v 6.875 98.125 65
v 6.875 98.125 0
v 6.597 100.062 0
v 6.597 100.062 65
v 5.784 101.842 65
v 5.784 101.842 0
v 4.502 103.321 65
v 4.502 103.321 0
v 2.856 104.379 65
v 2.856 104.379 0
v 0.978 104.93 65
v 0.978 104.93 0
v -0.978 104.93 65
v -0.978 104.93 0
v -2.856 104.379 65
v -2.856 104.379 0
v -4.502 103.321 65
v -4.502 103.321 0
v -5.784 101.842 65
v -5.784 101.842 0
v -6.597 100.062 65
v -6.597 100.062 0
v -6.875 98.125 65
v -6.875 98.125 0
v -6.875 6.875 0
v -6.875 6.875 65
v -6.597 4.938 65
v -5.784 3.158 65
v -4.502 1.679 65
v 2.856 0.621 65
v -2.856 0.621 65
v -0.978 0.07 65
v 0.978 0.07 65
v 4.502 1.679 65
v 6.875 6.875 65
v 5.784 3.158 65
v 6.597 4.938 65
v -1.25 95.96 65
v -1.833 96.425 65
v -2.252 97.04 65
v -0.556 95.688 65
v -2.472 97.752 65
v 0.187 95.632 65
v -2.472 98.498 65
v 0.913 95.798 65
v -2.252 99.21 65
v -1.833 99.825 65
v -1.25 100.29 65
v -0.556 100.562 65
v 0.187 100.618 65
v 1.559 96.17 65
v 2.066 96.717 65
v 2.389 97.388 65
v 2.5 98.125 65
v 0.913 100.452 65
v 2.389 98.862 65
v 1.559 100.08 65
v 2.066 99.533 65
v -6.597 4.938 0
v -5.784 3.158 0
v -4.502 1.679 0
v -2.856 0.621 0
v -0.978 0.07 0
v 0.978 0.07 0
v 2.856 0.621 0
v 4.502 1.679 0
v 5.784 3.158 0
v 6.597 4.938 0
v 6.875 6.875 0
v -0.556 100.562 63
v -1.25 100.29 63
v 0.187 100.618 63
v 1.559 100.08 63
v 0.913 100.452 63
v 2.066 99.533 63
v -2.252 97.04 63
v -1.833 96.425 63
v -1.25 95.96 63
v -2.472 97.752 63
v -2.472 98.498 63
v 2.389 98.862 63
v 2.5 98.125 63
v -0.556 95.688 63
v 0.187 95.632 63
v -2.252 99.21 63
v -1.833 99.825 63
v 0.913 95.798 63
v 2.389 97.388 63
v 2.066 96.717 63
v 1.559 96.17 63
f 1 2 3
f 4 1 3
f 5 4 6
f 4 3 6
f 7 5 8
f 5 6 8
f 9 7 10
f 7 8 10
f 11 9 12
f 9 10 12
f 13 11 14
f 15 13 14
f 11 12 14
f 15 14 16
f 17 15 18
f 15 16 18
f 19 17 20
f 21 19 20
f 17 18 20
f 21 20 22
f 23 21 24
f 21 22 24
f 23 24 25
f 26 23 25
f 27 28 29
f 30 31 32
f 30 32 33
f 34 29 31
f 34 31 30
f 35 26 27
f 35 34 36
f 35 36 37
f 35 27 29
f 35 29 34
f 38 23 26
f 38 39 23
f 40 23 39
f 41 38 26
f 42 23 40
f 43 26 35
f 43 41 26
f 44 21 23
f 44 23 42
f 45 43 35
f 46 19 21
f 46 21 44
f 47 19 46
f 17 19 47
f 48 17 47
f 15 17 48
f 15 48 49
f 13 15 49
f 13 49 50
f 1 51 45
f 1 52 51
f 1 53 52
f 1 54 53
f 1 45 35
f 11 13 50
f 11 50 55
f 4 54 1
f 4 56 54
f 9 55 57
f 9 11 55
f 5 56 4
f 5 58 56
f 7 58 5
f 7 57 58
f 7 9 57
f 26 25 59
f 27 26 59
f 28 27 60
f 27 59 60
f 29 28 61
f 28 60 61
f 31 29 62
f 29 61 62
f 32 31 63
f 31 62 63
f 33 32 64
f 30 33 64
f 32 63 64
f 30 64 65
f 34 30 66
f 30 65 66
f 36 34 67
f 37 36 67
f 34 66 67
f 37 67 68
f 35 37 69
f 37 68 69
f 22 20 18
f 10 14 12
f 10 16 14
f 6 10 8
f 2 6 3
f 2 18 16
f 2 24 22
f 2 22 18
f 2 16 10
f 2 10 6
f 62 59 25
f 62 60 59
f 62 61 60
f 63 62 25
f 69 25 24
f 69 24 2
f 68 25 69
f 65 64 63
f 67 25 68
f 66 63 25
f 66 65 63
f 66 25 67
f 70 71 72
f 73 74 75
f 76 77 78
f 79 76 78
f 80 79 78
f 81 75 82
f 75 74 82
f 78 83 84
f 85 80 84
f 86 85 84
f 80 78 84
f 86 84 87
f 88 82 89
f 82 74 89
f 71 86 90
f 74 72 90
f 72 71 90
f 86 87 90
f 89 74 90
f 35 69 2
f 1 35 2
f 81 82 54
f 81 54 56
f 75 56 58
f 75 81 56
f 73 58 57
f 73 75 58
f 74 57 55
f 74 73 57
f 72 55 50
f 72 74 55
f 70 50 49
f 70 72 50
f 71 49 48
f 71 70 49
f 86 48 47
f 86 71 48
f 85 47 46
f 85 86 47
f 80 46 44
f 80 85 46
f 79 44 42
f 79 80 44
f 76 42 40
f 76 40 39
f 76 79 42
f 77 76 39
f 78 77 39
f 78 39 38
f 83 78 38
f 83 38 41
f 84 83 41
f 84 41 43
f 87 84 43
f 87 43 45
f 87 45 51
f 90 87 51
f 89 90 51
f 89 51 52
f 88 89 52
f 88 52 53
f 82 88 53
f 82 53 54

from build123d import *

# Parameters (mm, degrees)
SKETCH_R     = 2.5
PAD_DEPTH    = 65
SKETCH001_R  = 2.5
PAD001_DEPTH = 63


with BuildPart() as part:
    # Sketch → Pad (new body)
    with BuildSketch(Plane.XY):
        with BuildLine():
            ThreePointArc((-6.875, 6.875), (0, 0), (6.875, 6.875))
            Line((6.875, 6.875), (6.875, 98.125))
            ThreePointArc((6.875, 98.125), (0, 105), (-6.875, 98.125))
            Line((-6.875, 98.125), (-6.875, 6.875))
        make_face()
        with Locations((0, 98.125)):
            Circle(SKETCH_R, mode=Mode.SUBTRACT)
    extrude(amount=PAD_DEPTH)

    # Sketch001 (on Face6 of Pad) → Pad001 (join)
    with BuildSketch(Plane(origin=(0, 0, 0), x_dir=(1, 0, 0), z_dir=(0, 0, -1))):
        with Locations((0, -98.125)):
            Circle(SKETCH001_R)
    extrude(amount=-PAD001_DEPTH)


solid = part.part
